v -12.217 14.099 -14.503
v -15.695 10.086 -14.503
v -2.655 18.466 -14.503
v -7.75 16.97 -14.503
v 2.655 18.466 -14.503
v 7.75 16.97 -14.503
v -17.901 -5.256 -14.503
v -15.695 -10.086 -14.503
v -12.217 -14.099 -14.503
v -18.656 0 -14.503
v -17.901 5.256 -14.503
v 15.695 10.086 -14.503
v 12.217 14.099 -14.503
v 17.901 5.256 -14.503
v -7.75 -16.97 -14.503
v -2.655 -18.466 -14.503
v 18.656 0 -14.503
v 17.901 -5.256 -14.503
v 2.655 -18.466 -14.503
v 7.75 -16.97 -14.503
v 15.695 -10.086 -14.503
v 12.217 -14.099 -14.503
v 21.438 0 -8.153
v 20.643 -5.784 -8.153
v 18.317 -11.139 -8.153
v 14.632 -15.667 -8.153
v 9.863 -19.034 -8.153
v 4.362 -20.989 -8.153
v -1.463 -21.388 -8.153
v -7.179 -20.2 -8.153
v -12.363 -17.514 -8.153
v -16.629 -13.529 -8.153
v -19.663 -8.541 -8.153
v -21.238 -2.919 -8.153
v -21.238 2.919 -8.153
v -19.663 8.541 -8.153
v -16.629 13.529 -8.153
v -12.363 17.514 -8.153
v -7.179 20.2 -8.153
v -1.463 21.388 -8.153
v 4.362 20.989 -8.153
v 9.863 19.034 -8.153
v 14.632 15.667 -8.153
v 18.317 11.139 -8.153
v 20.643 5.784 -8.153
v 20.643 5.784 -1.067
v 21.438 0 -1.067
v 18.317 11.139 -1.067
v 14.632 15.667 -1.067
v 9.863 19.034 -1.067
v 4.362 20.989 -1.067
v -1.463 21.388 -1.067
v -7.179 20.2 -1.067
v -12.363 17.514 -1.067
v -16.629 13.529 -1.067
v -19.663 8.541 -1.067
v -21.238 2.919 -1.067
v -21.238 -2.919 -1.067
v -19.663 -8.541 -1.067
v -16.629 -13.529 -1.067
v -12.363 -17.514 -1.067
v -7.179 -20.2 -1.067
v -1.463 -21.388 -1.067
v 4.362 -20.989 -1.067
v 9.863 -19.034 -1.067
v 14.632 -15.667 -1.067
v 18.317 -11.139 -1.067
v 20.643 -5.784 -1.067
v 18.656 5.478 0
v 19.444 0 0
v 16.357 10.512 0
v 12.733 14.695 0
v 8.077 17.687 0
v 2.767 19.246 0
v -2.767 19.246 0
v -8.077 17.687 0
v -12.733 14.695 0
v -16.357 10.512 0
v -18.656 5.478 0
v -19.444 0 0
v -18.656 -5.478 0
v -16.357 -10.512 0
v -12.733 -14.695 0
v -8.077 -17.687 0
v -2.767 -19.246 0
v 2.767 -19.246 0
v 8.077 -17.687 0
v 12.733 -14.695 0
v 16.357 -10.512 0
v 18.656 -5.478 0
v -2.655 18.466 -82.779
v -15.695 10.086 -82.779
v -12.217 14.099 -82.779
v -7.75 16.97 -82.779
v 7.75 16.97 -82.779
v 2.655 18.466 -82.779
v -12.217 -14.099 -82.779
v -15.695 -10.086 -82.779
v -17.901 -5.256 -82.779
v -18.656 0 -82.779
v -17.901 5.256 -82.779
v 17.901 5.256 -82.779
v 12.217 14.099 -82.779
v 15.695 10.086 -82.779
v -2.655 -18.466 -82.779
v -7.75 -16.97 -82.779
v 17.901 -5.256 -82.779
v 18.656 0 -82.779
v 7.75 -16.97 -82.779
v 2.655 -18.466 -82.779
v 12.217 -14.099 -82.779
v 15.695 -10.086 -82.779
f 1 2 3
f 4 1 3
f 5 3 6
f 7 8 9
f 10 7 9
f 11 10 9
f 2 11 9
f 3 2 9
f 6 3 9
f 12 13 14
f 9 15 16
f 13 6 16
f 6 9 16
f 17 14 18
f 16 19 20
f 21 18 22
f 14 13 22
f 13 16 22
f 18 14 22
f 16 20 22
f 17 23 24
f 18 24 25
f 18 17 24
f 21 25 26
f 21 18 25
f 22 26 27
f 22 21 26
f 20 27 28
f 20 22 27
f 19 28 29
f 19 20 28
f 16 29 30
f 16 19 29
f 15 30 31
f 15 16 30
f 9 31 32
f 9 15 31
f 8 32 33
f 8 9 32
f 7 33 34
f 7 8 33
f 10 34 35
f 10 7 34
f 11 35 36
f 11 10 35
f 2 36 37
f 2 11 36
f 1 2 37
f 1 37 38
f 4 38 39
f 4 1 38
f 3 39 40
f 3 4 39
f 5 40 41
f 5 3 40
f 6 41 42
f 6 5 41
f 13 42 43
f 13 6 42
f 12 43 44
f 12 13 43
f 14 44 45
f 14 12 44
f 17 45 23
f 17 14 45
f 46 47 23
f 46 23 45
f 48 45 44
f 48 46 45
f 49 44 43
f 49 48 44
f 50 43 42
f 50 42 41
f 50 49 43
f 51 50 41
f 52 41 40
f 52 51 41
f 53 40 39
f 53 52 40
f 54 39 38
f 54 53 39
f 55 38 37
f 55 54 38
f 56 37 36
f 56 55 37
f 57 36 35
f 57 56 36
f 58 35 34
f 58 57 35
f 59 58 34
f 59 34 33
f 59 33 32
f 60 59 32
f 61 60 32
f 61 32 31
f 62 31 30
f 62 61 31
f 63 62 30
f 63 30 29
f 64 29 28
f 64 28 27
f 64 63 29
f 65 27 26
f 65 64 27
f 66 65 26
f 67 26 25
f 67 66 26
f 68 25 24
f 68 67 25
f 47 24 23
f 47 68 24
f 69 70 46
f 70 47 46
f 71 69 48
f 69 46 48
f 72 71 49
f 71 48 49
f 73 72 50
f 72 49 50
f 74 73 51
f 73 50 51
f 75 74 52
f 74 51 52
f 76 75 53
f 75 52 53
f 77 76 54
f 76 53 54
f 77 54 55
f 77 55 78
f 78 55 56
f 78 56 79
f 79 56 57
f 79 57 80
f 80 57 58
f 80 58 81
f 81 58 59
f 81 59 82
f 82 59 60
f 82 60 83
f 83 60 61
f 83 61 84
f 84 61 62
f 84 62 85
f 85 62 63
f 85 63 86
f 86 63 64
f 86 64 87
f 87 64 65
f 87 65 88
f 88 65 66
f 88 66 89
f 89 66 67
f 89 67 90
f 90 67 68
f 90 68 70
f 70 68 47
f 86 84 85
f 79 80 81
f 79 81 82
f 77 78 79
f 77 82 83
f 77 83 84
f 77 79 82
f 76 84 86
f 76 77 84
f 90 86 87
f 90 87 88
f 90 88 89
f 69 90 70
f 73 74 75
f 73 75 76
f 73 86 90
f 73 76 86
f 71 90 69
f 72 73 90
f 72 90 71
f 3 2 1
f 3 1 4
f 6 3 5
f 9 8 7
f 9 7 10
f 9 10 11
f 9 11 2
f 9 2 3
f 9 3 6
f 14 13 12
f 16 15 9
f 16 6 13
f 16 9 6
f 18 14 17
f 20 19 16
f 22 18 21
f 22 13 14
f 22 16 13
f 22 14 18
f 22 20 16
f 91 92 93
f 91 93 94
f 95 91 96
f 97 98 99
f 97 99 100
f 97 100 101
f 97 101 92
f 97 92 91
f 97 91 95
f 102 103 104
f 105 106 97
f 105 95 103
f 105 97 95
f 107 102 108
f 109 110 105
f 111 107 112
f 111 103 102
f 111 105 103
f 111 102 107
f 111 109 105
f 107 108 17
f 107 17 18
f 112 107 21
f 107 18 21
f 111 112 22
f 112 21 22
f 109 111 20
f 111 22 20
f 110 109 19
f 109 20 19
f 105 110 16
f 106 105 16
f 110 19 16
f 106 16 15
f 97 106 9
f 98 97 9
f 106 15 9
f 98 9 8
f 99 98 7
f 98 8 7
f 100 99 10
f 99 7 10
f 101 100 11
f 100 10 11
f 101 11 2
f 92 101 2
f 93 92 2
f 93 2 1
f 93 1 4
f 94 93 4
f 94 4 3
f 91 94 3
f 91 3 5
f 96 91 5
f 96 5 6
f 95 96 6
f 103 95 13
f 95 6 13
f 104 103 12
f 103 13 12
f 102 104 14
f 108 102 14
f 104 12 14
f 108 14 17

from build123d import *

# Parameters (mm, degrees)
F0_R      = 19.4437
F2_R      = 21.4376
F4_DEPTH  = 7.0866
F4_FACE_R = 21.4376
F6_R      = 18.6563
F8_DEPTH  = 68.2752


with BuildPart() as f3:
    # F0 (on Top) → F3 section 0
    with BuildSketch(Plane.XY):
        Circle(F0_R)
    # F2 (on offset) → F3 section 1
    with BuildSketch(Plane.XY.offset(-1.0668)):
        Circle(F2_R)
    loft()

    # F4 (add): a face of the model
    f4_faces = [f3.faces().sort_by_distance(p)[0] for p in [
        (0, 0, -1.0668),
    ]]
    extrude(f4_faces, amount=F4_DEPTH)

    # F4_face (on face) → F7 section 0
    with BuildSketch(Plane(origin=(0, 0, -8.1534), x_dir=(1, 0, 0), z_dir=(0, 0, -1))):
        Circle(F4_FACE_R)
    # F6 (on offset) → F7 section 1
    with BuildSketch(Plane(origin=(0, 0, -14.5034), x_dir=(1, 0, 0), z_dir=(0, 0, -1))):
        Circle(F6_R)
    loft()


with BuildPart() as f8:
    # F8 (new): a face of the model
    f8_faces = [f3.part.faces().sort_by_distance(p)[0] for p in [
        (0, 0, -14.5034),
    ]]
    extrude(f8_faces, amount=F8_DEPTH)


solid = Compound([f3.part, f8.part])
